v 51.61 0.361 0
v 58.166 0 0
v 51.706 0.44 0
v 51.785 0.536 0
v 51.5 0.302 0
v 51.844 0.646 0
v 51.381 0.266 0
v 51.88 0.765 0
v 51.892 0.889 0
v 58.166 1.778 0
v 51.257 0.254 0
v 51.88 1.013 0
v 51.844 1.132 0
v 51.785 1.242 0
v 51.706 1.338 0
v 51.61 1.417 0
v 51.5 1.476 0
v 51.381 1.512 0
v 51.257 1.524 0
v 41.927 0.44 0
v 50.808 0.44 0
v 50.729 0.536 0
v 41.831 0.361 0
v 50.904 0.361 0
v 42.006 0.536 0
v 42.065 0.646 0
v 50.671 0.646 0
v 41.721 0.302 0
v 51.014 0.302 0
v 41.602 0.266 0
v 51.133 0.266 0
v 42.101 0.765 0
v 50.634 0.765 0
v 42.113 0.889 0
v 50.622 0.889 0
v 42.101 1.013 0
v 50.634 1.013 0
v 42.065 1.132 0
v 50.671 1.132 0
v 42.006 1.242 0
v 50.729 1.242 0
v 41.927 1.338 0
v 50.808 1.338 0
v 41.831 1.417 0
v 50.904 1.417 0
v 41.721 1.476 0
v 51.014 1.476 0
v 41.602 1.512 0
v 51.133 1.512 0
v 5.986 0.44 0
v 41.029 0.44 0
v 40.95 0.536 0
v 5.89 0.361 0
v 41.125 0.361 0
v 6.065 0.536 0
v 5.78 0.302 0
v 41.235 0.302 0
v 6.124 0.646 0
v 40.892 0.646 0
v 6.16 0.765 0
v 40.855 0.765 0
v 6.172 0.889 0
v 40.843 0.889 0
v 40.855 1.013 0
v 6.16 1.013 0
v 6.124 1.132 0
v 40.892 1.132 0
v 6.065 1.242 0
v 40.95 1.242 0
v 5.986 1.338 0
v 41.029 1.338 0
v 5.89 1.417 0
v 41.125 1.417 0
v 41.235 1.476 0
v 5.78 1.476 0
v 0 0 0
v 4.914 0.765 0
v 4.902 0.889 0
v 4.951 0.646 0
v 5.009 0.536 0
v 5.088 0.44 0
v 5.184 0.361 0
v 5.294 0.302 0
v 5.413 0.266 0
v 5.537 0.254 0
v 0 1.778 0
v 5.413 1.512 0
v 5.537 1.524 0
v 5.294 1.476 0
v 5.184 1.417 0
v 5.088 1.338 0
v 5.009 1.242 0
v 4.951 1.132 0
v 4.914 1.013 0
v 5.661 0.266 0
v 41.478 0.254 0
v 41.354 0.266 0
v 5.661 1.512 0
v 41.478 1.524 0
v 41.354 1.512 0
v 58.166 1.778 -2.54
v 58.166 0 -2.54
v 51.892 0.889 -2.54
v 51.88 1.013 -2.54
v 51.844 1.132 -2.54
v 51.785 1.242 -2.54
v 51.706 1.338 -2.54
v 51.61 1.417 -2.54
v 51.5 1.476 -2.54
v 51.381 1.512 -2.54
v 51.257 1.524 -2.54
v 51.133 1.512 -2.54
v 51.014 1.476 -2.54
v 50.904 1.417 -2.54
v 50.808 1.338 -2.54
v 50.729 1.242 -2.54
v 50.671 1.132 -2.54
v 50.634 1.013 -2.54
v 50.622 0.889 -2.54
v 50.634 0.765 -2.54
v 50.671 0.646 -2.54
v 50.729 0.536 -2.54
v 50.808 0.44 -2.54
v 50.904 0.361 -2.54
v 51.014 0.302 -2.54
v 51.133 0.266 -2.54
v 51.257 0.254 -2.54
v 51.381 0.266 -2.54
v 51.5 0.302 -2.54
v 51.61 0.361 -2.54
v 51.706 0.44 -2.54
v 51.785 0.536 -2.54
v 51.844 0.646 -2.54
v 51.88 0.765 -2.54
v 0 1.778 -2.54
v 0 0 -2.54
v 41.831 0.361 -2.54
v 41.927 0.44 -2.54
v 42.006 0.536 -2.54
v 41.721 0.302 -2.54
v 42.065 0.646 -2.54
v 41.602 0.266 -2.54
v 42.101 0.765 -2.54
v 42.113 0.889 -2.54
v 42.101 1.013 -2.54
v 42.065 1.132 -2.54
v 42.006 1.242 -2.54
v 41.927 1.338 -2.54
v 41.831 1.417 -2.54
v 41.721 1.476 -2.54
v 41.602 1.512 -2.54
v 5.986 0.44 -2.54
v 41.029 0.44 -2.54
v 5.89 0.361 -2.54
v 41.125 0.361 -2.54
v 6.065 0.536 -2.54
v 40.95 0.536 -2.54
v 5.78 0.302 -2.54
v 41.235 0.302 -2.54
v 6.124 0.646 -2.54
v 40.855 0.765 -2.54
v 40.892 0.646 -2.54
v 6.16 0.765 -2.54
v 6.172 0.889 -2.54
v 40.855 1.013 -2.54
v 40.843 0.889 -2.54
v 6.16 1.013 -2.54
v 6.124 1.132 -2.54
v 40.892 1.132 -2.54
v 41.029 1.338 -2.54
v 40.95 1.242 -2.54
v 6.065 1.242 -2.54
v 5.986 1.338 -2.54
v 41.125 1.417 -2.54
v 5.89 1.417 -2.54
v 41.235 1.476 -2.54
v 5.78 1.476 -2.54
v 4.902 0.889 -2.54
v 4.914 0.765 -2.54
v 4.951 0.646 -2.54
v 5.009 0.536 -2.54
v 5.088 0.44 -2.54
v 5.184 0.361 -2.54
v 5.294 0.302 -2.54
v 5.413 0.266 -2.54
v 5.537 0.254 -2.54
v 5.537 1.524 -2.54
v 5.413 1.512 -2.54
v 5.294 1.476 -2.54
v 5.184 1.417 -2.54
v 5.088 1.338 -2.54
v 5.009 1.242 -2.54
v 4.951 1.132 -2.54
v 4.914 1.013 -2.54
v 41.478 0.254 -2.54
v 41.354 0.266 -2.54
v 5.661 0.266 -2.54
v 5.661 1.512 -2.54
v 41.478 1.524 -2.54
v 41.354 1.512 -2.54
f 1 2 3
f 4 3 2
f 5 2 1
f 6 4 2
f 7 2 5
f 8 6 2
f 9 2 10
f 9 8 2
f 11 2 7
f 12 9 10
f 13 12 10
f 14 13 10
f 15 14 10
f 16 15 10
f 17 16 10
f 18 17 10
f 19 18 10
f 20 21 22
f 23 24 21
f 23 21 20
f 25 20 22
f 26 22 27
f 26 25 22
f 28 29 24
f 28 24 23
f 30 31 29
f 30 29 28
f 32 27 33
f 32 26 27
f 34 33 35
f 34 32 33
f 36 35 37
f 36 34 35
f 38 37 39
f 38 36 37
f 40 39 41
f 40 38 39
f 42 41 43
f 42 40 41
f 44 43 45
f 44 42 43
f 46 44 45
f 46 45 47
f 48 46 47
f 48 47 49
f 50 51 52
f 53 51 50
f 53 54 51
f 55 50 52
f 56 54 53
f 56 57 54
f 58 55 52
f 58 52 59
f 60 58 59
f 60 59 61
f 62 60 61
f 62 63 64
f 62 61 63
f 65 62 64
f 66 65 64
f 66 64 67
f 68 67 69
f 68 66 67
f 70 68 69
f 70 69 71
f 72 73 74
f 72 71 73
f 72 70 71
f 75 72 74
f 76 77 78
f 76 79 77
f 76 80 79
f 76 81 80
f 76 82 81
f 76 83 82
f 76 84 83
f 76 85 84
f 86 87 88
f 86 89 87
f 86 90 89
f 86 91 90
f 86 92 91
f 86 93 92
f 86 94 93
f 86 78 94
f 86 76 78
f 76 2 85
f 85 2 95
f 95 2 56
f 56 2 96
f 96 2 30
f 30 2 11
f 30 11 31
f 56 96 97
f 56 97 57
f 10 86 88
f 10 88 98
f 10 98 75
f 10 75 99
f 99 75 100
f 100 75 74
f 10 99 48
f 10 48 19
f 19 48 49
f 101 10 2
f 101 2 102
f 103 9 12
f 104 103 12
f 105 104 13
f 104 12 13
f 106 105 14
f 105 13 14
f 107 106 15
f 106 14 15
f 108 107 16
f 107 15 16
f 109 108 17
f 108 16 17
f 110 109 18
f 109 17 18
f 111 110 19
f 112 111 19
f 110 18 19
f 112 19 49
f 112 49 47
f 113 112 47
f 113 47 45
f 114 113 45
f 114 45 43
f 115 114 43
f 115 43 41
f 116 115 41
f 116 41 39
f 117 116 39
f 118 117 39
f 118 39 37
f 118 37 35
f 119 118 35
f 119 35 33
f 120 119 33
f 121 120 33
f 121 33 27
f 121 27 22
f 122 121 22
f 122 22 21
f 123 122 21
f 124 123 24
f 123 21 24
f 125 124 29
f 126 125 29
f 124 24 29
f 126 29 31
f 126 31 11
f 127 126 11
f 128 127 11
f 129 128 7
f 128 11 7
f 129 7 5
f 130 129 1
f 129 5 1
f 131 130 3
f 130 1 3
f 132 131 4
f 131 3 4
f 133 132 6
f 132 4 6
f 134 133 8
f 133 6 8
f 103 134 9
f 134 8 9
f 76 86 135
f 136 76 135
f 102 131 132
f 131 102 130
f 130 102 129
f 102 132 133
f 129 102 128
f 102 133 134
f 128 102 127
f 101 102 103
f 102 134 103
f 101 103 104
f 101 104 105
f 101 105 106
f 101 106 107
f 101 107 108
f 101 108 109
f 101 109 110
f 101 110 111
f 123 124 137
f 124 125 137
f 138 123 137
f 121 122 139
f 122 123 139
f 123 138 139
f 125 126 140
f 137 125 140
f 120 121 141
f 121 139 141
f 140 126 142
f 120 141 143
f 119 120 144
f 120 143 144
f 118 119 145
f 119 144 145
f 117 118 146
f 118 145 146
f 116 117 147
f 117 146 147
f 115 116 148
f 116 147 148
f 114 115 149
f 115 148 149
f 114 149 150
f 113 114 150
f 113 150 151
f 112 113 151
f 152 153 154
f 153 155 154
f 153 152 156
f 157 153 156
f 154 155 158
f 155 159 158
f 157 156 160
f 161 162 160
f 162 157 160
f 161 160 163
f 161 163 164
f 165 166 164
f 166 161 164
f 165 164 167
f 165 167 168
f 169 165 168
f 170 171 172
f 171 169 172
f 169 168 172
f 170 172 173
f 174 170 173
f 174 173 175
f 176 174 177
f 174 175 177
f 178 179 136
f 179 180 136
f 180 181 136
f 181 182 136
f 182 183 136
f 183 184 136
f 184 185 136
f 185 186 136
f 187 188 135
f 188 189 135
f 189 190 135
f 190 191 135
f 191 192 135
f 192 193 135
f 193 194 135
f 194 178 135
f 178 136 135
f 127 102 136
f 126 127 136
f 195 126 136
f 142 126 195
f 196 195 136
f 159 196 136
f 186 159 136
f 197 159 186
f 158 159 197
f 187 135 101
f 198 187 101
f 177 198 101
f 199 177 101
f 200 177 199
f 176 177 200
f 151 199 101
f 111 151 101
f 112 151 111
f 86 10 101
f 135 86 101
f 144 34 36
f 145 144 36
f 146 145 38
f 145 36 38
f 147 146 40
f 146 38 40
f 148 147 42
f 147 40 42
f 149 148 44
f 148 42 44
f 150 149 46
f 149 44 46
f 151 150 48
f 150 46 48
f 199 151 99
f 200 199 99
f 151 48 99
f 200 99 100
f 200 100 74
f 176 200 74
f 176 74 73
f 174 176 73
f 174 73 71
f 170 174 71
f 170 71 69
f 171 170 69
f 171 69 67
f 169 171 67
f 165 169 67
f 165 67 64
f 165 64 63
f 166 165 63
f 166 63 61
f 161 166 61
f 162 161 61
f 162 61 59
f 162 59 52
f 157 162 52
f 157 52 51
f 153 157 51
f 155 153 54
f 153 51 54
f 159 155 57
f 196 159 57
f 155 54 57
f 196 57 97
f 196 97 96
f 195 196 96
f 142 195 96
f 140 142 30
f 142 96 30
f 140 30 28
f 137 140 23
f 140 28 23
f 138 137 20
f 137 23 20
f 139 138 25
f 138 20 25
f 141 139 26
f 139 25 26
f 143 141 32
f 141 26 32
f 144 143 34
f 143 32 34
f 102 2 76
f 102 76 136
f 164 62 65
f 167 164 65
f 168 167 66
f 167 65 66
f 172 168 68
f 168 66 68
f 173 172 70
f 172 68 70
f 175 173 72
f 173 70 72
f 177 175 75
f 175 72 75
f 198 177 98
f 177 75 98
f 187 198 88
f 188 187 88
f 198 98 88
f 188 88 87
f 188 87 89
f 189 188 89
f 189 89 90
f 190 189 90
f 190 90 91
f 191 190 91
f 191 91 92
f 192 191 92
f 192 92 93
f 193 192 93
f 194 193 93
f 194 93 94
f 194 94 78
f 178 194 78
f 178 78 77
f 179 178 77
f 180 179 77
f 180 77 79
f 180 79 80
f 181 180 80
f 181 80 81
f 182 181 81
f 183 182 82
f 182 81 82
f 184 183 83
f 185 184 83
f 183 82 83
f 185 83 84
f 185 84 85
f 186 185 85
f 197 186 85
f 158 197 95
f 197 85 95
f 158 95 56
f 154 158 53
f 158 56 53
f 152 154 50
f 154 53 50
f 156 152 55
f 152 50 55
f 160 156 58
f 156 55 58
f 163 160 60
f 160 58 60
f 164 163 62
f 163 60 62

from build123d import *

# Parameters (mm, degrees)
SKETCH5_W           = 2.54
SKETCH5_H           = 1.778
BOSS_EXTRUDE3_DEPTH = 58.166
SKETCH6_R           = 0.635
CUT_EXTRUDE3_DEPTH  = 3.54
SKETCH8_R           = 0.635
CUT_EXTRUDE4_DEPTH  = 3.54


with BuildPart() as part:
    # Sketch5 → Boss-Extrude3 (new body)
    with BuildSketch(Plane(origin=(0, 0, 0), x_dir=(0, 0, -1), z_dir=(1, 0, 0))):
        with Locations((1.27, 0.889)):
            Rectangle(SKETCH5_W, SKETCH5_H)
    extrude(amount=BOSS_EXTRUDE3_DEPTH)

    # Sketch6 → Cut-Extrude3 (cut, through all)
    with BuildSketch(Plane.XY):
        with Locations((5.5372, 0.889)):
            Circle(SKETCH6_R)
    extrude(amount=-CUT_EXTRUDE3_DEPTH, mode=Mode.SUBTRACT)

    # Sketch8 → Cut-Extrude4 (cut, through all)
    with BuildSketch(Plane.XY):
        with Locations((41.4782, 0.889)):
            Circle(SKETCH8_R)
        with Locations((51.2572, 0.889)):
            Circle(SKETCH8_R)
    extrude(amount=-CUT_EXTRUDE4_DEPTH, mode=Mode.SUBTRACT)


solid = part.part
